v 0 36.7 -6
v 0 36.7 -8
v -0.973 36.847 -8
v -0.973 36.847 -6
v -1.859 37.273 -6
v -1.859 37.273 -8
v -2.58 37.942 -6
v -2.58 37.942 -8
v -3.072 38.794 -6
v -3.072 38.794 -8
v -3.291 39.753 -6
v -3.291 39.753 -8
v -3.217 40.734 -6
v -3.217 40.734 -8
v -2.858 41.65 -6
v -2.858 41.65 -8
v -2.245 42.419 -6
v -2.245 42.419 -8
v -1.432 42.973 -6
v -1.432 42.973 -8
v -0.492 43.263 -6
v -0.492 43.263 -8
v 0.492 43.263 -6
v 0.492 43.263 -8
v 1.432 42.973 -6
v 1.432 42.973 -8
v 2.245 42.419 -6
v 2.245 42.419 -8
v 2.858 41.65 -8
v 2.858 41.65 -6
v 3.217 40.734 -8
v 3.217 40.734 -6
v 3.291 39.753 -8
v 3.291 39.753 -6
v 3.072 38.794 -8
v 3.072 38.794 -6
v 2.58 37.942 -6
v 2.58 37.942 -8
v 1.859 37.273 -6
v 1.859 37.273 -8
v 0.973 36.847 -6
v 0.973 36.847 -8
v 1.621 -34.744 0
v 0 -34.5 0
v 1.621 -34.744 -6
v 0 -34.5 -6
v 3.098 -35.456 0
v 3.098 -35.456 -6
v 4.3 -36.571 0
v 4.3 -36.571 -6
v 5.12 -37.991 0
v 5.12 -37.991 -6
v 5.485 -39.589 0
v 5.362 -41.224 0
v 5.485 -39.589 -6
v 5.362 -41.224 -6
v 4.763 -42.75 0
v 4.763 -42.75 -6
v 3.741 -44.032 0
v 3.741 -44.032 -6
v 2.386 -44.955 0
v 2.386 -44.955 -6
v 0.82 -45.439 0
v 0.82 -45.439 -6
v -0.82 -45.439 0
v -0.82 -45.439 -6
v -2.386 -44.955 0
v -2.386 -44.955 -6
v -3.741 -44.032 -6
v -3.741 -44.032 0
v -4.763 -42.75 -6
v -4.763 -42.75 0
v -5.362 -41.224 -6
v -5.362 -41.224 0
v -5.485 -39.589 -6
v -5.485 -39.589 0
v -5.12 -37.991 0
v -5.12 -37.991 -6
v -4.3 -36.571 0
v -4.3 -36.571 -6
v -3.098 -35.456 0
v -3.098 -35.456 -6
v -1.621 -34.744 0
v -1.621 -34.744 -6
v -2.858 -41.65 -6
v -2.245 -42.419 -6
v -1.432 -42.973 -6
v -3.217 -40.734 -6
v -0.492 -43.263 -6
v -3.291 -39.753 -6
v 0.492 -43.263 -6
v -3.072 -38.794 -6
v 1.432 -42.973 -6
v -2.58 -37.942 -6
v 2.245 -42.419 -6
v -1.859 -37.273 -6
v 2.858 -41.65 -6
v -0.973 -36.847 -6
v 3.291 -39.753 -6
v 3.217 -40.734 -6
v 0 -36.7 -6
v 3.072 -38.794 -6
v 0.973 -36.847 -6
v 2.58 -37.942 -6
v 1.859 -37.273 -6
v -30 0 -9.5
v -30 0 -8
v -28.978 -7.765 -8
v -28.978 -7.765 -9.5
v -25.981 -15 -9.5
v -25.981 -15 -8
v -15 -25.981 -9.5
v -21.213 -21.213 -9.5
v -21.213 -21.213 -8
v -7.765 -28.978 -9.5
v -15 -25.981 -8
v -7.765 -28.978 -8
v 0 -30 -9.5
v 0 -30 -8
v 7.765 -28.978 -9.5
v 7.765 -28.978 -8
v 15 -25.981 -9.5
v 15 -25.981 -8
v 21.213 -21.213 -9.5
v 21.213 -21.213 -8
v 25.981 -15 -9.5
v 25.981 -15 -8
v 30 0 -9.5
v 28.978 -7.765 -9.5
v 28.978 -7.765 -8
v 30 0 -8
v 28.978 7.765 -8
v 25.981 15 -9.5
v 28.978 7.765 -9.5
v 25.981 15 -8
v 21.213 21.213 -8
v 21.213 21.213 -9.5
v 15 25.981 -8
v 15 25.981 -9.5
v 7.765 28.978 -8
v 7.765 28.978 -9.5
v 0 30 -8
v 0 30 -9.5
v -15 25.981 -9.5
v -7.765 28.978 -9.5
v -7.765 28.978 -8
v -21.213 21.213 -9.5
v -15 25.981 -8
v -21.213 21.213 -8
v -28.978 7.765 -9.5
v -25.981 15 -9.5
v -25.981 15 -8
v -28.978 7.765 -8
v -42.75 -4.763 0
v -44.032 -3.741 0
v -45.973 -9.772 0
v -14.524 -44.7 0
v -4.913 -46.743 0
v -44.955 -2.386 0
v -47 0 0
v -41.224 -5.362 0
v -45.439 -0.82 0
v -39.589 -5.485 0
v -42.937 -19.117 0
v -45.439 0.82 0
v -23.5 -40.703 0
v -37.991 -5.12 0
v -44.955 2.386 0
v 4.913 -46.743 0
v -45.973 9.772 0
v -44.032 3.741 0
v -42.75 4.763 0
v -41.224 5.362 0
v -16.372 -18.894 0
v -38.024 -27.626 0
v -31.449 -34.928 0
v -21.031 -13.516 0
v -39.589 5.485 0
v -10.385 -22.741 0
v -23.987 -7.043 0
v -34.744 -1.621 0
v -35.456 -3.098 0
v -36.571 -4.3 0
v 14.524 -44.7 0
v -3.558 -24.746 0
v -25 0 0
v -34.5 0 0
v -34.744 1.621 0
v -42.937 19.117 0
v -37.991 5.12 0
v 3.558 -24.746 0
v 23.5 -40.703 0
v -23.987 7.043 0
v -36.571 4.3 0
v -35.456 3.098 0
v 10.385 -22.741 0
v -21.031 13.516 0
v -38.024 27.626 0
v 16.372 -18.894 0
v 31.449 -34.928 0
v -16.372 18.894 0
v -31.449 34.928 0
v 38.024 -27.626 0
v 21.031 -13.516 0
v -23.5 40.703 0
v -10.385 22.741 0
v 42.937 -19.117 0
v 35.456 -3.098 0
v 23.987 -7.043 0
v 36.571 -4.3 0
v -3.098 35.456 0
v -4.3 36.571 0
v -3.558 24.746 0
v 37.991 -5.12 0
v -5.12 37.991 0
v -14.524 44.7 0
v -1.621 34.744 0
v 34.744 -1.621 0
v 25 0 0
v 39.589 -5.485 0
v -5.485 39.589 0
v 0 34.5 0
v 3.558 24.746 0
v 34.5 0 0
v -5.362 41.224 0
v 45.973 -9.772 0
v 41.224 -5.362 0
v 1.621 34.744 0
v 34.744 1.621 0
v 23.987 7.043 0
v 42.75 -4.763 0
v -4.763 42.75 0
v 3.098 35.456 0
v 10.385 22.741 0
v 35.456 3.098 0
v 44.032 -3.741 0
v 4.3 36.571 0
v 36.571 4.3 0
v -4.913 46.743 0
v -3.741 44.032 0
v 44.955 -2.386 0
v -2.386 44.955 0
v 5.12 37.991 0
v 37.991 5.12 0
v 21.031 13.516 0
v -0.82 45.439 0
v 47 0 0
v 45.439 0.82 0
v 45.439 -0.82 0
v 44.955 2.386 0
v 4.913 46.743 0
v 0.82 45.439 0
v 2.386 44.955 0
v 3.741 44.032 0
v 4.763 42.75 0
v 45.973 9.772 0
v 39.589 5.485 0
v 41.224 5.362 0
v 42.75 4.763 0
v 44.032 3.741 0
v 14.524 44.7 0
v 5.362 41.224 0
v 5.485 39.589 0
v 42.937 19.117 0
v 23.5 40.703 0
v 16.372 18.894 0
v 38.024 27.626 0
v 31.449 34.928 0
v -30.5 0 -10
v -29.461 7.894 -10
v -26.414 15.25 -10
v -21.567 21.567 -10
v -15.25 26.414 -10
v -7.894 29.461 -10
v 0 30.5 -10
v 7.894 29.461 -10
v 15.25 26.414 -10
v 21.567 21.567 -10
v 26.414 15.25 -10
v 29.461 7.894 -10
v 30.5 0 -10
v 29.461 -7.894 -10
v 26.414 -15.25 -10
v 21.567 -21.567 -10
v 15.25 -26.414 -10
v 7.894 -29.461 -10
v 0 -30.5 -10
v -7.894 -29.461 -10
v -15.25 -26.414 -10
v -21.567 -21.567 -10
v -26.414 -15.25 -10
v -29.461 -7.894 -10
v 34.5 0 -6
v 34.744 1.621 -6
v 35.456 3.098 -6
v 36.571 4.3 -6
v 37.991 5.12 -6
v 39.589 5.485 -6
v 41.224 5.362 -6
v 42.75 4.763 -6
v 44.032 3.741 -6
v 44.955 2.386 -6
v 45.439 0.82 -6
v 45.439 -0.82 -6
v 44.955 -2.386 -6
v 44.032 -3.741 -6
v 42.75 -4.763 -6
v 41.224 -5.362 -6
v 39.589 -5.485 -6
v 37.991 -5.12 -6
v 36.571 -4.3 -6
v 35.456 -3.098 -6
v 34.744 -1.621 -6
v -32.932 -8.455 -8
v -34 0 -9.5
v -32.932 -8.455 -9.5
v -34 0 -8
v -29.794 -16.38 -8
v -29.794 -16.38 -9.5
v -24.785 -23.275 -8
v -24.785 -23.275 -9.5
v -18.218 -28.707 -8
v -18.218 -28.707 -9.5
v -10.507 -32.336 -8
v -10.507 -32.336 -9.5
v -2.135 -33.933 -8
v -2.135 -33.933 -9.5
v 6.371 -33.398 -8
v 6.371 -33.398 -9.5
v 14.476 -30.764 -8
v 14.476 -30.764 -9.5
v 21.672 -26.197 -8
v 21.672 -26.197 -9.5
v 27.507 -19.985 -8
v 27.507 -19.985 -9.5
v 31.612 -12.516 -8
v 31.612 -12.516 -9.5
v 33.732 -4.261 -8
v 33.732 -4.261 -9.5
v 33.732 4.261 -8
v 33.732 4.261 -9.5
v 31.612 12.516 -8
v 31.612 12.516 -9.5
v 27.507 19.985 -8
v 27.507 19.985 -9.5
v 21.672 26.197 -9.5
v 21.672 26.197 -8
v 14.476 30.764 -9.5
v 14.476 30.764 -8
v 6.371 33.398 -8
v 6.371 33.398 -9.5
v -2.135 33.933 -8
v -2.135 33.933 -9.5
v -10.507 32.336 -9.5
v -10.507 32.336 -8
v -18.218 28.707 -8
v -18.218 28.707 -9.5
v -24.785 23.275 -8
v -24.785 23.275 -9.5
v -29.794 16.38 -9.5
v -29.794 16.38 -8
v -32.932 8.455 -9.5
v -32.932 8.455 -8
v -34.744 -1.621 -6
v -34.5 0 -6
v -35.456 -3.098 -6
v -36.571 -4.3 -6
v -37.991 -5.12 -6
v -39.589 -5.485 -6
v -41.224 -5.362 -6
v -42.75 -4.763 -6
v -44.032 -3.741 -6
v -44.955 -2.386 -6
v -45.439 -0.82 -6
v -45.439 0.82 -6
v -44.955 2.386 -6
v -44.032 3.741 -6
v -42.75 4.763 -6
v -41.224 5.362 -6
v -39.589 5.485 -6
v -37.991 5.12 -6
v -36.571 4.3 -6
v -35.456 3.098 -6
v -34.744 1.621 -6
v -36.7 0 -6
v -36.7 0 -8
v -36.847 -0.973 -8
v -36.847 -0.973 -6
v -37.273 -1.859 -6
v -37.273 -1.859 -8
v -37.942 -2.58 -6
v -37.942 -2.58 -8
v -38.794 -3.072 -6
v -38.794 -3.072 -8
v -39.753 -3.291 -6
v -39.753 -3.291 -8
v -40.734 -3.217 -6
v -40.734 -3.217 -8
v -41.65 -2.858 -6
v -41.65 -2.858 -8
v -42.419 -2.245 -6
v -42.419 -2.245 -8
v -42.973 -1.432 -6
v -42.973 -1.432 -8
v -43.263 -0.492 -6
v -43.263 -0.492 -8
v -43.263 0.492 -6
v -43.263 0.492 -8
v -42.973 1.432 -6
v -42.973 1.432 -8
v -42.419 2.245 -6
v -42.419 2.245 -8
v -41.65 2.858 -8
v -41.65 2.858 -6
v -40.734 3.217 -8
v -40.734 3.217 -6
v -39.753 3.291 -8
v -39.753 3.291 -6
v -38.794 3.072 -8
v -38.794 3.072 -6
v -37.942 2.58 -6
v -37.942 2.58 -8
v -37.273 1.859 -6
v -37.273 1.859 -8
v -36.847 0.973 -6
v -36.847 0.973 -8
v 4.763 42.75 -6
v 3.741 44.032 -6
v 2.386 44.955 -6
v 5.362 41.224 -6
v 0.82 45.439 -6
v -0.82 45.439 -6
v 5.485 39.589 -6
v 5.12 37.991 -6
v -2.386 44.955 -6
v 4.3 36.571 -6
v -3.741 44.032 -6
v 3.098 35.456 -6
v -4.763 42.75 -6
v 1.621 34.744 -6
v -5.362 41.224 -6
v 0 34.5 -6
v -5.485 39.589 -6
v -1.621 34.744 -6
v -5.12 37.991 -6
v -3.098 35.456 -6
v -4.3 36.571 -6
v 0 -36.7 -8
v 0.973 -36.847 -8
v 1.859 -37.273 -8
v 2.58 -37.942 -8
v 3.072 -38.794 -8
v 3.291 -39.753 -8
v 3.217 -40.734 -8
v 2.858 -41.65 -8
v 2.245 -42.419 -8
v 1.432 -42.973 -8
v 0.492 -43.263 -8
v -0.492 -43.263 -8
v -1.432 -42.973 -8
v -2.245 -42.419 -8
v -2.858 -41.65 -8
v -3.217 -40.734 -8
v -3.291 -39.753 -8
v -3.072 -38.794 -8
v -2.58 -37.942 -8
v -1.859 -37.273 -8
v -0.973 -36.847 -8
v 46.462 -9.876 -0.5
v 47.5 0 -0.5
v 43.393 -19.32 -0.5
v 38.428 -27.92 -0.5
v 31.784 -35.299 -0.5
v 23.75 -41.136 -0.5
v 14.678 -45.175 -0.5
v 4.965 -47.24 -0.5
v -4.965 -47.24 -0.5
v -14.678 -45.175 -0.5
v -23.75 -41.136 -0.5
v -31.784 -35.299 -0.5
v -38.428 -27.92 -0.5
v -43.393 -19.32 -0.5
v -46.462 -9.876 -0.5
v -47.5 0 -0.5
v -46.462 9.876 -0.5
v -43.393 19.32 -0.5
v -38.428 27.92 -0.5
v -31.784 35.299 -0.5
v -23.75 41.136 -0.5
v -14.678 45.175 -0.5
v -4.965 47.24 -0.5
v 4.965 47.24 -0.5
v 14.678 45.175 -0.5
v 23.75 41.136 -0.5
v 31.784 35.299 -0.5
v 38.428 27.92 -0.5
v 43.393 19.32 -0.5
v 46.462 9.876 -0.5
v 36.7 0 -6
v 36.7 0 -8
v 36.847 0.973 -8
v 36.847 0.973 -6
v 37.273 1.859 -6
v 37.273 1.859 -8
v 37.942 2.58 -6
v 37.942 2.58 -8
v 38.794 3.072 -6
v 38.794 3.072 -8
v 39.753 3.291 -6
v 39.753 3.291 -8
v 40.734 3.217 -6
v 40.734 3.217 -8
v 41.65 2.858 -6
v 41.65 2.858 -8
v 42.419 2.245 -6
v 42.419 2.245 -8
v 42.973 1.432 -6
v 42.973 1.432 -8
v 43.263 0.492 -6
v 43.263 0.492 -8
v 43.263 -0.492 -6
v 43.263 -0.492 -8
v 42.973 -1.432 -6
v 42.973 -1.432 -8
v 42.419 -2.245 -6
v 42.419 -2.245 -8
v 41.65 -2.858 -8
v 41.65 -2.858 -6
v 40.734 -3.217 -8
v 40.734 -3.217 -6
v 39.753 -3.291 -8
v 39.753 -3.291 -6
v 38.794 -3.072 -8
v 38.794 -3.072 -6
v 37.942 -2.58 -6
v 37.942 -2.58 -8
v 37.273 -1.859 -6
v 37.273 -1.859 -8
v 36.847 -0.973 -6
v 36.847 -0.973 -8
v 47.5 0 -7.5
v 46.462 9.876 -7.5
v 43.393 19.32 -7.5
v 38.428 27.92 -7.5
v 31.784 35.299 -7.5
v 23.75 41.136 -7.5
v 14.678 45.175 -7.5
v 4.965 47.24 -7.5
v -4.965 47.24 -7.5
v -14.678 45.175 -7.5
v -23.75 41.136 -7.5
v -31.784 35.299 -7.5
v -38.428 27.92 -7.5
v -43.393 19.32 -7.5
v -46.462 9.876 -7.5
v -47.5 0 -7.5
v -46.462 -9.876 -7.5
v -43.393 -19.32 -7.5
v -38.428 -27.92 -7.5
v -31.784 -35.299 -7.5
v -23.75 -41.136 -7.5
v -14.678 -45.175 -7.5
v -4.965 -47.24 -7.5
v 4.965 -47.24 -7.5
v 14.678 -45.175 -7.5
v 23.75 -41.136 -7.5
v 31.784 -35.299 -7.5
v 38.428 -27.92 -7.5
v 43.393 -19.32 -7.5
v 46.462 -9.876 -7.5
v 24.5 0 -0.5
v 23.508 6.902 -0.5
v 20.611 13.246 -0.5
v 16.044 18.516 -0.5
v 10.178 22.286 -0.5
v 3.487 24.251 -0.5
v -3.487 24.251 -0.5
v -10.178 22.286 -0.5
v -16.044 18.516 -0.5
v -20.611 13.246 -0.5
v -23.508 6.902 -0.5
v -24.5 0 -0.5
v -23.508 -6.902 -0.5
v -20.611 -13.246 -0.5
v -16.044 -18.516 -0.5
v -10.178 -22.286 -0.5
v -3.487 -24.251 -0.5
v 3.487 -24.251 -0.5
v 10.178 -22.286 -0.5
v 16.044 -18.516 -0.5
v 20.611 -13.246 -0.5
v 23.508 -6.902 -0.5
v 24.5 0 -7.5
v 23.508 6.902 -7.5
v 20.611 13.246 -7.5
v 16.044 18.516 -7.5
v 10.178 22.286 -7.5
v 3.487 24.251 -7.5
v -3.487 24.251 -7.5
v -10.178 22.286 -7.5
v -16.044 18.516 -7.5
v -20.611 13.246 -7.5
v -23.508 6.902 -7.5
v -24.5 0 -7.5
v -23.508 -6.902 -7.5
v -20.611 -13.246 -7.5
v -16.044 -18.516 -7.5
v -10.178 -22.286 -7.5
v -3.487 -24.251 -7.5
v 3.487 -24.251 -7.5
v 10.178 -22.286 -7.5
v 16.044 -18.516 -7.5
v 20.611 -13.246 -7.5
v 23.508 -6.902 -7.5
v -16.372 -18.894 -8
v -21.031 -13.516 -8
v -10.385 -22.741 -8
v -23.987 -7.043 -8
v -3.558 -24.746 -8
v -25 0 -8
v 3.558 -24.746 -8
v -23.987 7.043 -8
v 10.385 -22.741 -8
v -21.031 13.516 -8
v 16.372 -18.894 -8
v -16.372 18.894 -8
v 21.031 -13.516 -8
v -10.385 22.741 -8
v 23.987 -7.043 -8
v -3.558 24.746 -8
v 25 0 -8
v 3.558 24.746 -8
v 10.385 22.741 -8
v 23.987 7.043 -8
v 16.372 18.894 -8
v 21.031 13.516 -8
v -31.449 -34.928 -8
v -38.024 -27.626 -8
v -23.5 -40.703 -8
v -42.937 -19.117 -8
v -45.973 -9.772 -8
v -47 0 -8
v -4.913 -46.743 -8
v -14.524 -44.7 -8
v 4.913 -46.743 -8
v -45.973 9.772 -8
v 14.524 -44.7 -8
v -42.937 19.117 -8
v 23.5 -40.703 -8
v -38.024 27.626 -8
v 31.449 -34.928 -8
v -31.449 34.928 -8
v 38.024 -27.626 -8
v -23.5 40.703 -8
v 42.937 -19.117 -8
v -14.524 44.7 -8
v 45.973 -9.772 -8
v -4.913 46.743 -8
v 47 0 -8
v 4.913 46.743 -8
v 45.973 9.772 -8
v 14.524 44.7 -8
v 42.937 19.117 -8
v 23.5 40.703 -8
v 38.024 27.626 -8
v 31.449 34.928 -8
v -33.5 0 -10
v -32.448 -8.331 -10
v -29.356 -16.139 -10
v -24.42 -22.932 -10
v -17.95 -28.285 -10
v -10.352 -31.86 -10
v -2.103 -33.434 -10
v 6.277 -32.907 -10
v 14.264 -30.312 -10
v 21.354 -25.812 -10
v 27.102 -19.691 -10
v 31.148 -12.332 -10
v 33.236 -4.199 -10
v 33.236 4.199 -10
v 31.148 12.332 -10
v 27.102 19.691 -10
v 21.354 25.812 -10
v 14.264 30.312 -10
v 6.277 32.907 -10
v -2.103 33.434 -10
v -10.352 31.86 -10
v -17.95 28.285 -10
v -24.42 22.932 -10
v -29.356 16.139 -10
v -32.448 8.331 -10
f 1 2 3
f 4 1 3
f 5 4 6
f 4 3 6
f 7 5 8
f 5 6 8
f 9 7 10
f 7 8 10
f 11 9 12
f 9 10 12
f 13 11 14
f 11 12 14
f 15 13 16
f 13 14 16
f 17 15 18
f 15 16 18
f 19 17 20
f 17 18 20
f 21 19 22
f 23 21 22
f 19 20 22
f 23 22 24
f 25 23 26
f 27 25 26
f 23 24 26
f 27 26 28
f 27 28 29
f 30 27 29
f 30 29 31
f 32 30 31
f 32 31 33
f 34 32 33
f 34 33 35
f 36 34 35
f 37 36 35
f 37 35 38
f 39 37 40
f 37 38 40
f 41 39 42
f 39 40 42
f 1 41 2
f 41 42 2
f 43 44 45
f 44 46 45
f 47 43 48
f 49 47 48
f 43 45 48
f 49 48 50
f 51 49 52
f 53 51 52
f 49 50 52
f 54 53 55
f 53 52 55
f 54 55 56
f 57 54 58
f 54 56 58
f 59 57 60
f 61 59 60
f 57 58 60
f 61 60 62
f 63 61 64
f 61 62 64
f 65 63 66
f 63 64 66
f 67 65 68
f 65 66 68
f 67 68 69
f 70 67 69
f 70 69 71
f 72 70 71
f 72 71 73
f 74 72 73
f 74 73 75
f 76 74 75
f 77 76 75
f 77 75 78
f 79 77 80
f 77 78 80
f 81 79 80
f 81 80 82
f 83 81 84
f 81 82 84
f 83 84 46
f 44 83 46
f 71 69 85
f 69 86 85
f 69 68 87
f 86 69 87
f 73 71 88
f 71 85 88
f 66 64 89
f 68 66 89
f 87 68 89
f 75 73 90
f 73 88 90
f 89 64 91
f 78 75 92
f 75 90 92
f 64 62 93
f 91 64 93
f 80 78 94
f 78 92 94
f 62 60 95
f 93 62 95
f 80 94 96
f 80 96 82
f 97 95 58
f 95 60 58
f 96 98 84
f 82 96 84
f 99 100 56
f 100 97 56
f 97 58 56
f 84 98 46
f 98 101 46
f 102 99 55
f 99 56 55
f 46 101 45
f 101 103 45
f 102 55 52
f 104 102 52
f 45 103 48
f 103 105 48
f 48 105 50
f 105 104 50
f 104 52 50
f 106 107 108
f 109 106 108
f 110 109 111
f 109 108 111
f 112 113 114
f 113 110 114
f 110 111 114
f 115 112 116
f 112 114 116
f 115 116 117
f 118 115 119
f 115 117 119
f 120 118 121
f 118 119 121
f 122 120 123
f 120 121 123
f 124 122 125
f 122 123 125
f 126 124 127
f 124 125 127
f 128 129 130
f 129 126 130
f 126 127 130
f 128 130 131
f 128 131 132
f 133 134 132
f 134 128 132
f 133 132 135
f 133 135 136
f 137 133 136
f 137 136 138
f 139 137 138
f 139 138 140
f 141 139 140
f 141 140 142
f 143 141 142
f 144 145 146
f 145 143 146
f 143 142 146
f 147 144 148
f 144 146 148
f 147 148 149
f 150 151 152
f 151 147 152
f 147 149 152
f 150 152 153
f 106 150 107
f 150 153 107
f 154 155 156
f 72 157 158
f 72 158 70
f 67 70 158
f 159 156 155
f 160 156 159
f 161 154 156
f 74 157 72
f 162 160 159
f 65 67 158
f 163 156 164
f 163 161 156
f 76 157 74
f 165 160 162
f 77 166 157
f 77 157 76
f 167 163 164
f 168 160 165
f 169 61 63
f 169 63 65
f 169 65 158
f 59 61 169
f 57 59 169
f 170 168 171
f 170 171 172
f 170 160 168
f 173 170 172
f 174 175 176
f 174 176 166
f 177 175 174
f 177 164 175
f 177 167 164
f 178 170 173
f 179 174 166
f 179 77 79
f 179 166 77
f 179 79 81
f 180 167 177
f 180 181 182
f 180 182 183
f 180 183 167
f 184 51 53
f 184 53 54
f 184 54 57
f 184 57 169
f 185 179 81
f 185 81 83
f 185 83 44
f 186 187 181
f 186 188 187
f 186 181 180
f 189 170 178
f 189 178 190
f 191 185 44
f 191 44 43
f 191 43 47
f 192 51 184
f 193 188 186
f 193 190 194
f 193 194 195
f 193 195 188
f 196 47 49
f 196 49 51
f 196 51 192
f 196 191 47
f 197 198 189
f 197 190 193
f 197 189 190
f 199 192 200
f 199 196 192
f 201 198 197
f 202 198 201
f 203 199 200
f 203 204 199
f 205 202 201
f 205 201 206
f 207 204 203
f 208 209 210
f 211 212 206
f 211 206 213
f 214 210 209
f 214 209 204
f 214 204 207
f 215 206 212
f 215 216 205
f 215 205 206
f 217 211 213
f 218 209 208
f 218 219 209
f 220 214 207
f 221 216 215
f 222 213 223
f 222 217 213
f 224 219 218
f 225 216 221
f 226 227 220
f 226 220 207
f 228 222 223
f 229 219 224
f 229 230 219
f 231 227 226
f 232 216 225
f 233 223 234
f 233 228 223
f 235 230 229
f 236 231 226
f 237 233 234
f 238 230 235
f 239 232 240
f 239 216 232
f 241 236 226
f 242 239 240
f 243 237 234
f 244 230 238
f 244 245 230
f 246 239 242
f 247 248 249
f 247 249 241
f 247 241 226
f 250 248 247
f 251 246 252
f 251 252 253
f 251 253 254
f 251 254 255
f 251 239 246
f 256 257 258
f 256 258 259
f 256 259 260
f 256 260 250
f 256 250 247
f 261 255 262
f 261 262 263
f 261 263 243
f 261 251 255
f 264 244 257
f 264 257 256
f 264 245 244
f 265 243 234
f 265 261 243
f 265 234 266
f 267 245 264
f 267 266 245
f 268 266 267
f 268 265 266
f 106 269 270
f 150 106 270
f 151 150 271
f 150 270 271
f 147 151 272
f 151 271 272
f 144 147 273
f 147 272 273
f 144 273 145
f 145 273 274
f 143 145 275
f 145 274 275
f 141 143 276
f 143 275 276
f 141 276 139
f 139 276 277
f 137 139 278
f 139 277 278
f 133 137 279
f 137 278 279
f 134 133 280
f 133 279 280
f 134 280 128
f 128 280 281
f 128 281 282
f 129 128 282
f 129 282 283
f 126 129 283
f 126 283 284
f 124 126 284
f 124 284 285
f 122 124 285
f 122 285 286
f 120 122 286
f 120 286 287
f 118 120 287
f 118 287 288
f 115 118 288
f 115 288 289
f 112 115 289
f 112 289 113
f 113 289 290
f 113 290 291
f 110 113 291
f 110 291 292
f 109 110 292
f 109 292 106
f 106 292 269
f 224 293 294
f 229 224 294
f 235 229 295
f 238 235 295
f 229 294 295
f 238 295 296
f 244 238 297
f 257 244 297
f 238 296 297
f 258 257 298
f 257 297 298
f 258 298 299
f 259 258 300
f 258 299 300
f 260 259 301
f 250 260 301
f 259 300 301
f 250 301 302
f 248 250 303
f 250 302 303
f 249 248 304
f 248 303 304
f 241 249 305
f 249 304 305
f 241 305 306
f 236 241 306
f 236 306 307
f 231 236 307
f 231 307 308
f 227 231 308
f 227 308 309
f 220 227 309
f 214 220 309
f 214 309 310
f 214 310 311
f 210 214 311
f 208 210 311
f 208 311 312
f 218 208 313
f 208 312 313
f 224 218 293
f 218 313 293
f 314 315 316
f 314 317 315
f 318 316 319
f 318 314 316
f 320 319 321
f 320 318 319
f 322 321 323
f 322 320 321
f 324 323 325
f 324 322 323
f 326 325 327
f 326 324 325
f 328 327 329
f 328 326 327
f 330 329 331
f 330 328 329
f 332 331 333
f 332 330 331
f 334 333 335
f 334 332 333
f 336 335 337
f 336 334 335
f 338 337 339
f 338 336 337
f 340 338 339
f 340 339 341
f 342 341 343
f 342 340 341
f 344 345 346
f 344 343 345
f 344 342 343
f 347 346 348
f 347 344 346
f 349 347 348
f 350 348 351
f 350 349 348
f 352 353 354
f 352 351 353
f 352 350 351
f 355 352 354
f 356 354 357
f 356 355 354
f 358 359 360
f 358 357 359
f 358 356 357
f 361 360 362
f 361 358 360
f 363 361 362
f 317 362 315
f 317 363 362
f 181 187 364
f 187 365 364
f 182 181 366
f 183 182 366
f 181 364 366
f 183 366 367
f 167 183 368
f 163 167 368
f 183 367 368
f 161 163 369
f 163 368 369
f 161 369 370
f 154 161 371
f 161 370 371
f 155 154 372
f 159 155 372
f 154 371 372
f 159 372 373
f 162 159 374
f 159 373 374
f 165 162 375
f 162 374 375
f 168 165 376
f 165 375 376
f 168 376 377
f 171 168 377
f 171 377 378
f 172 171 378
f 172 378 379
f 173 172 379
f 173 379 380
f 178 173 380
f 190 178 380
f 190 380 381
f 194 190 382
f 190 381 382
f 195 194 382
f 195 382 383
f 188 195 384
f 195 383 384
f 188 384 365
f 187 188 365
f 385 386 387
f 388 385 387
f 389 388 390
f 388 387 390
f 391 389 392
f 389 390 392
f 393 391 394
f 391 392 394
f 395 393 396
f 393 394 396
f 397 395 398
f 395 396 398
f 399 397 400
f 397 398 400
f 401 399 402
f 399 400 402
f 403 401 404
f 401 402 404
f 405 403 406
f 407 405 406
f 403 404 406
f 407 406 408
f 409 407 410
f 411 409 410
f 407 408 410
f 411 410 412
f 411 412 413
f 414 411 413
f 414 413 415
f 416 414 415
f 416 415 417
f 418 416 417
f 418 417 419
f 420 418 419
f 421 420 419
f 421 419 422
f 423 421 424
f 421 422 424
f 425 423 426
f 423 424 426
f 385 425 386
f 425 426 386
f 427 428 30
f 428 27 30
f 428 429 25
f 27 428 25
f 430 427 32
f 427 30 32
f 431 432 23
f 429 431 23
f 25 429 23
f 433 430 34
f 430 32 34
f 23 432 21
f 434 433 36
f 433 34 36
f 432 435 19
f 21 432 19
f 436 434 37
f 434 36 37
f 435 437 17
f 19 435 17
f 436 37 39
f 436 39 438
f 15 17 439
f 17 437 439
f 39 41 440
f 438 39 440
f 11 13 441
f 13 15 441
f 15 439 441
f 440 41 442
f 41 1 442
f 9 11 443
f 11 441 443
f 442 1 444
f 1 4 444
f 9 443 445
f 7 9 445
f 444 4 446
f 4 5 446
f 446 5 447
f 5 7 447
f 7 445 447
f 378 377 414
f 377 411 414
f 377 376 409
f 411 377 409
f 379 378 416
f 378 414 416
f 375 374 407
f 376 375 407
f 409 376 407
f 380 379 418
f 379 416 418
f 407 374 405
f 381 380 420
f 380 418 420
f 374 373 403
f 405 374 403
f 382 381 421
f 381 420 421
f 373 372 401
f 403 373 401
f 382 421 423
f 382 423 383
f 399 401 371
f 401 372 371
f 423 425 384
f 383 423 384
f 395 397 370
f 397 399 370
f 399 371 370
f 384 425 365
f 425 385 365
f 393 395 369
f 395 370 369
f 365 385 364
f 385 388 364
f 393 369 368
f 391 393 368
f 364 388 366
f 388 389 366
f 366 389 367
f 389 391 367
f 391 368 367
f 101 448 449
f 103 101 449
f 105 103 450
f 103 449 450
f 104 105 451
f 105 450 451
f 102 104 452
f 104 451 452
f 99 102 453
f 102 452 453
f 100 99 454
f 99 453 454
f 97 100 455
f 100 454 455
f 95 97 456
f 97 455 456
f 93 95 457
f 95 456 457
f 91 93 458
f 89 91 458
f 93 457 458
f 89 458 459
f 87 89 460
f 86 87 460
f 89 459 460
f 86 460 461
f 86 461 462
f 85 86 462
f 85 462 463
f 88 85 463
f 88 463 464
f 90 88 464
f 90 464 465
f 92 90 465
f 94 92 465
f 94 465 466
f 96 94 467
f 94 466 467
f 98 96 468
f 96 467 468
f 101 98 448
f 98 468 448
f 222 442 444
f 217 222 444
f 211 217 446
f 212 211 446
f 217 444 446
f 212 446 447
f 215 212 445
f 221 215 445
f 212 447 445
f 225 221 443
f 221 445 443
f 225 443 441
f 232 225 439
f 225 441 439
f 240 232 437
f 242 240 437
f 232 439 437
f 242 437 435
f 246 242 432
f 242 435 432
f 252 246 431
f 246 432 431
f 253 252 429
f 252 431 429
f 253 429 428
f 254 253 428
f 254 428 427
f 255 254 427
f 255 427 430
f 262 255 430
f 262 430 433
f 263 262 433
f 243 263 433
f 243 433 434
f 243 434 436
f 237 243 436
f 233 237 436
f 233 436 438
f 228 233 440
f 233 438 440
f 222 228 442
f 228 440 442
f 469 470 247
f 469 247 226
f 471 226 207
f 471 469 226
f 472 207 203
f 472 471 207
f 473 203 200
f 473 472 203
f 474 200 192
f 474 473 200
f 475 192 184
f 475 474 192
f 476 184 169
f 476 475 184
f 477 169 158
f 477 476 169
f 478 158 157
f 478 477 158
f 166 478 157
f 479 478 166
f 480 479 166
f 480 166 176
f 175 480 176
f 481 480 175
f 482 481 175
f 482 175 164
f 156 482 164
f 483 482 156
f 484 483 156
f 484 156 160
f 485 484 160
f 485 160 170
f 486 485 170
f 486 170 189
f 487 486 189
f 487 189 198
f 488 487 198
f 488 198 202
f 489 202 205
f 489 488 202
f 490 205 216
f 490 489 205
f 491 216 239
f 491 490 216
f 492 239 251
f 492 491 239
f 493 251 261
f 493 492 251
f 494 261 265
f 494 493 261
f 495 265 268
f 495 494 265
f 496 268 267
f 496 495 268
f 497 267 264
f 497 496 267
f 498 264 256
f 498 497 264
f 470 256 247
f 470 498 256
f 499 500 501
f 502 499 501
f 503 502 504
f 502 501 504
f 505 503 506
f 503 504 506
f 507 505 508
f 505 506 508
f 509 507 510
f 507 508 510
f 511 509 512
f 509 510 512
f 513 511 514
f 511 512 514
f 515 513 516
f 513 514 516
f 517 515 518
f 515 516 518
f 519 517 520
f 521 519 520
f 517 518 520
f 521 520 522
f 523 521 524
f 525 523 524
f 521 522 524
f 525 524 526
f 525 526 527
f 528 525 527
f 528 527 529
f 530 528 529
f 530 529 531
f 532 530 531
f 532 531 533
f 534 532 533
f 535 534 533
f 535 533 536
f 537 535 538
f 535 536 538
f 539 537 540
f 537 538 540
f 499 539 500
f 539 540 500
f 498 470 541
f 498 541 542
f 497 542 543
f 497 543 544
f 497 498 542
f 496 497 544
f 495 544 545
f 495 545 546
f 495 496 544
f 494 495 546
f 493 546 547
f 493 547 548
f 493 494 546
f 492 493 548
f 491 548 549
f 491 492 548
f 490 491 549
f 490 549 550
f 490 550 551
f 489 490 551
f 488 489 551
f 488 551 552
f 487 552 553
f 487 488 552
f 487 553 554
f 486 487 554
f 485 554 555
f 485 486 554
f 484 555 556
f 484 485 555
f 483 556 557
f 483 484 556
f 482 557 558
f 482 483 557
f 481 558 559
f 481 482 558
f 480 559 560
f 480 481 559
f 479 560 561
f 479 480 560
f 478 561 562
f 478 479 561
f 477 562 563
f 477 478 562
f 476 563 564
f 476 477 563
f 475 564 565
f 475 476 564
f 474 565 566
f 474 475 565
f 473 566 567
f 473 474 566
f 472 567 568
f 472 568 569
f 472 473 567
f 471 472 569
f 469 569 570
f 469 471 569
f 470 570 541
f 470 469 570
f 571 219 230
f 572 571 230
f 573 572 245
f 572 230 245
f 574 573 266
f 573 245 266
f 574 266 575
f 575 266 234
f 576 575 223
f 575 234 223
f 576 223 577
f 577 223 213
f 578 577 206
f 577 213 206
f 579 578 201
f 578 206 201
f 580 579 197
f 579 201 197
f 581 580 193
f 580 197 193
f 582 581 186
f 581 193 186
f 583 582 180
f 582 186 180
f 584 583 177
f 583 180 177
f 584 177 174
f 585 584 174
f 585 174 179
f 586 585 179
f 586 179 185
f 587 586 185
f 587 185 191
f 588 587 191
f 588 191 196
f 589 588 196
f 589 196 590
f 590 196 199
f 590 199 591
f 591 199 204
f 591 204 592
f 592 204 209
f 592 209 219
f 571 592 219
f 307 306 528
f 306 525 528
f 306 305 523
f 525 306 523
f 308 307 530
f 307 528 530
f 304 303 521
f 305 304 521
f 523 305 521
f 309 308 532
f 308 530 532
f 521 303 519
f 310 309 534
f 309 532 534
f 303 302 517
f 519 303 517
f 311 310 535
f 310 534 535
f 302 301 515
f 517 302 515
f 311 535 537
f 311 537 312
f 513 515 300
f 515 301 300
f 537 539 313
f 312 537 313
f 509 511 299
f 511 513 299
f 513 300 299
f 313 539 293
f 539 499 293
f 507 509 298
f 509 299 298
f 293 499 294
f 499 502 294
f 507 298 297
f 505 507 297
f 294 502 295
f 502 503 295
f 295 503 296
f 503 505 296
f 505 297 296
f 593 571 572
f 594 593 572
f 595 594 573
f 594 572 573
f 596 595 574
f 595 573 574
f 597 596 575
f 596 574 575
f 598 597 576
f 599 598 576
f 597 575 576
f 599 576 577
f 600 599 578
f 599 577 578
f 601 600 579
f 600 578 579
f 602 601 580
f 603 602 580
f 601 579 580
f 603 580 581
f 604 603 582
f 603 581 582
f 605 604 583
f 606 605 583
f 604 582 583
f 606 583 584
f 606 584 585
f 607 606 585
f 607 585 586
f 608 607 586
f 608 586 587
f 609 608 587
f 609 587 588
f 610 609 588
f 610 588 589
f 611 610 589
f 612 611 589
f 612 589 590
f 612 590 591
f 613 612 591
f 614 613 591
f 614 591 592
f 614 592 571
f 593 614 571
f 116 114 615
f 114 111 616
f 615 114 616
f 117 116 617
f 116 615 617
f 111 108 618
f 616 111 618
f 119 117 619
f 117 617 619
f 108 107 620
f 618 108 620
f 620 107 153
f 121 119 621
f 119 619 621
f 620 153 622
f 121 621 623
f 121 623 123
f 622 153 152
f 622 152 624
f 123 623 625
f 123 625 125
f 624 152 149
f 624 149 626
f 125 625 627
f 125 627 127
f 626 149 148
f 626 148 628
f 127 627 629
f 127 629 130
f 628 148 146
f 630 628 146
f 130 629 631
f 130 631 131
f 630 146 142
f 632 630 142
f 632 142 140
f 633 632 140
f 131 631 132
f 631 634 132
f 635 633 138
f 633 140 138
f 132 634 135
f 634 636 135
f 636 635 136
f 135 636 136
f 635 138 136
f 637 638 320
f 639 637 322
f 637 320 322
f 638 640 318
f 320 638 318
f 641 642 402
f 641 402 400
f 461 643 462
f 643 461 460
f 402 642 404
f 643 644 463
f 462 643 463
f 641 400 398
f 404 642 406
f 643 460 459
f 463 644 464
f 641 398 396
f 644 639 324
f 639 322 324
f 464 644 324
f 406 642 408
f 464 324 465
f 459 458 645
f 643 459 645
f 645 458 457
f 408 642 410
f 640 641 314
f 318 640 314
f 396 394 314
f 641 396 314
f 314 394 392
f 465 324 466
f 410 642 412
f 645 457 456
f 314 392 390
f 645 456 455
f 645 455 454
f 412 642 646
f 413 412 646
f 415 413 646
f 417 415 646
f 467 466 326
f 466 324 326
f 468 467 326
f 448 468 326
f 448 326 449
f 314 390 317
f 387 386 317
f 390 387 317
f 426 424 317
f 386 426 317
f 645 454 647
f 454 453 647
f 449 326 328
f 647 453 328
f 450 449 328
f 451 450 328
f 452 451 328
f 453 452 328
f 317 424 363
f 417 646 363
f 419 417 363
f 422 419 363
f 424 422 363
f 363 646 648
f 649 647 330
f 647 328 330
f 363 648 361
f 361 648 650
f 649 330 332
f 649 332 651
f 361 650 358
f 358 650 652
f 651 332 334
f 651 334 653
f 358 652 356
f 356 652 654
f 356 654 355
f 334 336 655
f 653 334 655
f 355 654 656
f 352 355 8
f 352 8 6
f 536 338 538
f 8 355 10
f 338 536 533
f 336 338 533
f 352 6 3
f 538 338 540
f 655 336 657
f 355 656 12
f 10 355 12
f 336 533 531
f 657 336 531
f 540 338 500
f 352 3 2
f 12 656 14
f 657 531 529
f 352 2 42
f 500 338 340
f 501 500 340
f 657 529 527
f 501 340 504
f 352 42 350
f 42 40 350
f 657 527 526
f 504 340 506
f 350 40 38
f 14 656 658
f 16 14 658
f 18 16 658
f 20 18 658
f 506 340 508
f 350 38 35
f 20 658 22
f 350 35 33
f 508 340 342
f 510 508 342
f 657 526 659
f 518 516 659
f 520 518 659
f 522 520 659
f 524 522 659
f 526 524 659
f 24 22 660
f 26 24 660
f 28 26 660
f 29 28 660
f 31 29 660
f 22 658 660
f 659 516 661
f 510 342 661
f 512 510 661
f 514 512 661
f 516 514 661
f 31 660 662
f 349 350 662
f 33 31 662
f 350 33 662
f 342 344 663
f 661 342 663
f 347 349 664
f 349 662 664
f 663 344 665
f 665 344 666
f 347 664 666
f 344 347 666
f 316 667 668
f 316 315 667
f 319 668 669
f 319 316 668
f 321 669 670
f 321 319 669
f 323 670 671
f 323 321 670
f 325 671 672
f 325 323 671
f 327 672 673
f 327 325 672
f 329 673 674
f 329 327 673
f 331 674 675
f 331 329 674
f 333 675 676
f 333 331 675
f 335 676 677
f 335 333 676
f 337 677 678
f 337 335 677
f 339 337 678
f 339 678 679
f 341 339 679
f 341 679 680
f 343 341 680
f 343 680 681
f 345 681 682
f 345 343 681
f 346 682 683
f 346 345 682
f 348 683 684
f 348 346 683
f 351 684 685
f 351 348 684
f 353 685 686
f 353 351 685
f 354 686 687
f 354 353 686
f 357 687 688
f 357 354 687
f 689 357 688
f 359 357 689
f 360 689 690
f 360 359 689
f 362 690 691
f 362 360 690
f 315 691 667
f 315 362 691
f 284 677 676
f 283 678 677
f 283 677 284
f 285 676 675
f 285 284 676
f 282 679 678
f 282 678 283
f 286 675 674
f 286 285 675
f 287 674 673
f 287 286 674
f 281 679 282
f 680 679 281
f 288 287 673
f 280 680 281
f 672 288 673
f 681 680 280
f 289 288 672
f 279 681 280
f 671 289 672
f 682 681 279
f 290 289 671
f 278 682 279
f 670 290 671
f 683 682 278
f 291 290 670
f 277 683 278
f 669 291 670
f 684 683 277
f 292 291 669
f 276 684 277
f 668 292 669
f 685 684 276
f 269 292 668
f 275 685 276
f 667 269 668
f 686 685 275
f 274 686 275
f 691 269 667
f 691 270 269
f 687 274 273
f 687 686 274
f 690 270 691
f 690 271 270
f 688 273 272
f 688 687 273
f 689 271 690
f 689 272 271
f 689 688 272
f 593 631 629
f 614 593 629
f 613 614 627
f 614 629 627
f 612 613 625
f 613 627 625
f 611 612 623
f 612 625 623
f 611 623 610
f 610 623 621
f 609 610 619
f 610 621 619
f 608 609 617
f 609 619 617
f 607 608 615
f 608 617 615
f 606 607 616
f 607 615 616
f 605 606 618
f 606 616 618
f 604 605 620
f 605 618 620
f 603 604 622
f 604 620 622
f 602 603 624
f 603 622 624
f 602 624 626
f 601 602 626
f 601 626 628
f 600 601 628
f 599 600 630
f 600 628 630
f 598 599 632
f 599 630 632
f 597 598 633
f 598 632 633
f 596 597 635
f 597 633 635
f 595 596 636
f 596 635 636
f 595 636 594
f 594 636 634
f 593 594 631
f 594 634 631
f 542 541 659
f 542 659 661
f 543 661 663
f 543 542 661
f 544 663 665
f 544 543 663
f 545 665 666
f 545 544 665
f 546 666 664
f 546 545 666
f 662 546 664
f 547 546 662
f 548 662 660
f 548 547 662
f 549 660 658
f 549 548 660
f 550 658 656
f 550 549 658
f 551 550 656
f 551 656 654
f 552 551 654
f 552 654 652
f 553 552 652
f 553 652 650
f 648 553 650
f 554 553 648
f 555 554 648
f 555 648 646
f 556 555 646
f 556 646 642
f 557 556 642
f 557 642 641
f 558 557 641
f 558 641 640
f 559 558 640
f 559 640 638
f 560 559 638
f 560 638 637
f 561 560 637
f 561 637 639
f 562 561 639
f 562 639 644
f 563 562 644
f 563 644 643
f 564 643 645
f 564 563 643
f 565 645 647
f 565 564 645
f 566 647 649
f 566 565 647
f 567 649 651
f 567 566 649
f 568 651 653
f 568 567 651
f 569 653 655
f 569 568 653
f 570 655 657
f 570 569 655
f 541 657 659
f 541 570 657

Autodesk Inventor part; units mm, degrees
ref_plane "YZ Plane" through (0, 0, 0) normal (1, 0, 0) x (0, 1, 0)
ref_plane "XZ Plane" through (0, 0, 0) normal (0, 1, 0) x (-1, 0, 0)
ref_plane "XY Plane" through (0, 0, 0) normal (0, 0, 1) x (1, 0, 0)
sketch "Esboço1" plane through (0, 0, 0) normal (0, 0, 1) x (1, 0, 0)
  circle A0 centre (0, 0) radius 24.5
  circle A1 centre (0, 0) radius 47.5
  dimension "d0" = 49
  dimension "d1" = 95
extrude "Extrusão1" add sketch "Esboço1" against normal blind 8
sketch "Esboço2" plane through (0, 0, -8) normal (0, 0, -1) x (-1, 0, 0)
  circle A0 centre (0, 0) radius 24.5 projected
  circle A1 centre (0, 0) radius 30
  circle A2 centre (0, 0) radius 34
  dimension "d4" = 60
  dimension "d5" = 68
extrude "Extrusão2" add sketch "Esboço2" along normal blind 2 contours A2
sketch "Esboço3" plane through (0, 0, 0) normal (0, 0, 1) x (1, 0, 0)
  circle A0 centre (0, 0) radius 47.5 projected
  point P0 (0, 40)
  dimension "d8" = 40
hole "Furo1" at (0, 40, 0) direction (0, 0, -1) diameter 6.6 depth 10 tip angle 118 counterbore diameter 11 counterbore depth 6
pattern_circular "Padrão circular1" count 4 over 360 about axis through (0, 0, -10) along (0, 0, 1) of "Furo1"
chamfer "Chanfro1" distance 0.5 angle 45 6 edges at (-24.5, 0, 0) (-24.5, 0, -8) (-47.5, 0, 0) (-47.5, 0, -8) (34, 0, -10) (30, 0, -10)
